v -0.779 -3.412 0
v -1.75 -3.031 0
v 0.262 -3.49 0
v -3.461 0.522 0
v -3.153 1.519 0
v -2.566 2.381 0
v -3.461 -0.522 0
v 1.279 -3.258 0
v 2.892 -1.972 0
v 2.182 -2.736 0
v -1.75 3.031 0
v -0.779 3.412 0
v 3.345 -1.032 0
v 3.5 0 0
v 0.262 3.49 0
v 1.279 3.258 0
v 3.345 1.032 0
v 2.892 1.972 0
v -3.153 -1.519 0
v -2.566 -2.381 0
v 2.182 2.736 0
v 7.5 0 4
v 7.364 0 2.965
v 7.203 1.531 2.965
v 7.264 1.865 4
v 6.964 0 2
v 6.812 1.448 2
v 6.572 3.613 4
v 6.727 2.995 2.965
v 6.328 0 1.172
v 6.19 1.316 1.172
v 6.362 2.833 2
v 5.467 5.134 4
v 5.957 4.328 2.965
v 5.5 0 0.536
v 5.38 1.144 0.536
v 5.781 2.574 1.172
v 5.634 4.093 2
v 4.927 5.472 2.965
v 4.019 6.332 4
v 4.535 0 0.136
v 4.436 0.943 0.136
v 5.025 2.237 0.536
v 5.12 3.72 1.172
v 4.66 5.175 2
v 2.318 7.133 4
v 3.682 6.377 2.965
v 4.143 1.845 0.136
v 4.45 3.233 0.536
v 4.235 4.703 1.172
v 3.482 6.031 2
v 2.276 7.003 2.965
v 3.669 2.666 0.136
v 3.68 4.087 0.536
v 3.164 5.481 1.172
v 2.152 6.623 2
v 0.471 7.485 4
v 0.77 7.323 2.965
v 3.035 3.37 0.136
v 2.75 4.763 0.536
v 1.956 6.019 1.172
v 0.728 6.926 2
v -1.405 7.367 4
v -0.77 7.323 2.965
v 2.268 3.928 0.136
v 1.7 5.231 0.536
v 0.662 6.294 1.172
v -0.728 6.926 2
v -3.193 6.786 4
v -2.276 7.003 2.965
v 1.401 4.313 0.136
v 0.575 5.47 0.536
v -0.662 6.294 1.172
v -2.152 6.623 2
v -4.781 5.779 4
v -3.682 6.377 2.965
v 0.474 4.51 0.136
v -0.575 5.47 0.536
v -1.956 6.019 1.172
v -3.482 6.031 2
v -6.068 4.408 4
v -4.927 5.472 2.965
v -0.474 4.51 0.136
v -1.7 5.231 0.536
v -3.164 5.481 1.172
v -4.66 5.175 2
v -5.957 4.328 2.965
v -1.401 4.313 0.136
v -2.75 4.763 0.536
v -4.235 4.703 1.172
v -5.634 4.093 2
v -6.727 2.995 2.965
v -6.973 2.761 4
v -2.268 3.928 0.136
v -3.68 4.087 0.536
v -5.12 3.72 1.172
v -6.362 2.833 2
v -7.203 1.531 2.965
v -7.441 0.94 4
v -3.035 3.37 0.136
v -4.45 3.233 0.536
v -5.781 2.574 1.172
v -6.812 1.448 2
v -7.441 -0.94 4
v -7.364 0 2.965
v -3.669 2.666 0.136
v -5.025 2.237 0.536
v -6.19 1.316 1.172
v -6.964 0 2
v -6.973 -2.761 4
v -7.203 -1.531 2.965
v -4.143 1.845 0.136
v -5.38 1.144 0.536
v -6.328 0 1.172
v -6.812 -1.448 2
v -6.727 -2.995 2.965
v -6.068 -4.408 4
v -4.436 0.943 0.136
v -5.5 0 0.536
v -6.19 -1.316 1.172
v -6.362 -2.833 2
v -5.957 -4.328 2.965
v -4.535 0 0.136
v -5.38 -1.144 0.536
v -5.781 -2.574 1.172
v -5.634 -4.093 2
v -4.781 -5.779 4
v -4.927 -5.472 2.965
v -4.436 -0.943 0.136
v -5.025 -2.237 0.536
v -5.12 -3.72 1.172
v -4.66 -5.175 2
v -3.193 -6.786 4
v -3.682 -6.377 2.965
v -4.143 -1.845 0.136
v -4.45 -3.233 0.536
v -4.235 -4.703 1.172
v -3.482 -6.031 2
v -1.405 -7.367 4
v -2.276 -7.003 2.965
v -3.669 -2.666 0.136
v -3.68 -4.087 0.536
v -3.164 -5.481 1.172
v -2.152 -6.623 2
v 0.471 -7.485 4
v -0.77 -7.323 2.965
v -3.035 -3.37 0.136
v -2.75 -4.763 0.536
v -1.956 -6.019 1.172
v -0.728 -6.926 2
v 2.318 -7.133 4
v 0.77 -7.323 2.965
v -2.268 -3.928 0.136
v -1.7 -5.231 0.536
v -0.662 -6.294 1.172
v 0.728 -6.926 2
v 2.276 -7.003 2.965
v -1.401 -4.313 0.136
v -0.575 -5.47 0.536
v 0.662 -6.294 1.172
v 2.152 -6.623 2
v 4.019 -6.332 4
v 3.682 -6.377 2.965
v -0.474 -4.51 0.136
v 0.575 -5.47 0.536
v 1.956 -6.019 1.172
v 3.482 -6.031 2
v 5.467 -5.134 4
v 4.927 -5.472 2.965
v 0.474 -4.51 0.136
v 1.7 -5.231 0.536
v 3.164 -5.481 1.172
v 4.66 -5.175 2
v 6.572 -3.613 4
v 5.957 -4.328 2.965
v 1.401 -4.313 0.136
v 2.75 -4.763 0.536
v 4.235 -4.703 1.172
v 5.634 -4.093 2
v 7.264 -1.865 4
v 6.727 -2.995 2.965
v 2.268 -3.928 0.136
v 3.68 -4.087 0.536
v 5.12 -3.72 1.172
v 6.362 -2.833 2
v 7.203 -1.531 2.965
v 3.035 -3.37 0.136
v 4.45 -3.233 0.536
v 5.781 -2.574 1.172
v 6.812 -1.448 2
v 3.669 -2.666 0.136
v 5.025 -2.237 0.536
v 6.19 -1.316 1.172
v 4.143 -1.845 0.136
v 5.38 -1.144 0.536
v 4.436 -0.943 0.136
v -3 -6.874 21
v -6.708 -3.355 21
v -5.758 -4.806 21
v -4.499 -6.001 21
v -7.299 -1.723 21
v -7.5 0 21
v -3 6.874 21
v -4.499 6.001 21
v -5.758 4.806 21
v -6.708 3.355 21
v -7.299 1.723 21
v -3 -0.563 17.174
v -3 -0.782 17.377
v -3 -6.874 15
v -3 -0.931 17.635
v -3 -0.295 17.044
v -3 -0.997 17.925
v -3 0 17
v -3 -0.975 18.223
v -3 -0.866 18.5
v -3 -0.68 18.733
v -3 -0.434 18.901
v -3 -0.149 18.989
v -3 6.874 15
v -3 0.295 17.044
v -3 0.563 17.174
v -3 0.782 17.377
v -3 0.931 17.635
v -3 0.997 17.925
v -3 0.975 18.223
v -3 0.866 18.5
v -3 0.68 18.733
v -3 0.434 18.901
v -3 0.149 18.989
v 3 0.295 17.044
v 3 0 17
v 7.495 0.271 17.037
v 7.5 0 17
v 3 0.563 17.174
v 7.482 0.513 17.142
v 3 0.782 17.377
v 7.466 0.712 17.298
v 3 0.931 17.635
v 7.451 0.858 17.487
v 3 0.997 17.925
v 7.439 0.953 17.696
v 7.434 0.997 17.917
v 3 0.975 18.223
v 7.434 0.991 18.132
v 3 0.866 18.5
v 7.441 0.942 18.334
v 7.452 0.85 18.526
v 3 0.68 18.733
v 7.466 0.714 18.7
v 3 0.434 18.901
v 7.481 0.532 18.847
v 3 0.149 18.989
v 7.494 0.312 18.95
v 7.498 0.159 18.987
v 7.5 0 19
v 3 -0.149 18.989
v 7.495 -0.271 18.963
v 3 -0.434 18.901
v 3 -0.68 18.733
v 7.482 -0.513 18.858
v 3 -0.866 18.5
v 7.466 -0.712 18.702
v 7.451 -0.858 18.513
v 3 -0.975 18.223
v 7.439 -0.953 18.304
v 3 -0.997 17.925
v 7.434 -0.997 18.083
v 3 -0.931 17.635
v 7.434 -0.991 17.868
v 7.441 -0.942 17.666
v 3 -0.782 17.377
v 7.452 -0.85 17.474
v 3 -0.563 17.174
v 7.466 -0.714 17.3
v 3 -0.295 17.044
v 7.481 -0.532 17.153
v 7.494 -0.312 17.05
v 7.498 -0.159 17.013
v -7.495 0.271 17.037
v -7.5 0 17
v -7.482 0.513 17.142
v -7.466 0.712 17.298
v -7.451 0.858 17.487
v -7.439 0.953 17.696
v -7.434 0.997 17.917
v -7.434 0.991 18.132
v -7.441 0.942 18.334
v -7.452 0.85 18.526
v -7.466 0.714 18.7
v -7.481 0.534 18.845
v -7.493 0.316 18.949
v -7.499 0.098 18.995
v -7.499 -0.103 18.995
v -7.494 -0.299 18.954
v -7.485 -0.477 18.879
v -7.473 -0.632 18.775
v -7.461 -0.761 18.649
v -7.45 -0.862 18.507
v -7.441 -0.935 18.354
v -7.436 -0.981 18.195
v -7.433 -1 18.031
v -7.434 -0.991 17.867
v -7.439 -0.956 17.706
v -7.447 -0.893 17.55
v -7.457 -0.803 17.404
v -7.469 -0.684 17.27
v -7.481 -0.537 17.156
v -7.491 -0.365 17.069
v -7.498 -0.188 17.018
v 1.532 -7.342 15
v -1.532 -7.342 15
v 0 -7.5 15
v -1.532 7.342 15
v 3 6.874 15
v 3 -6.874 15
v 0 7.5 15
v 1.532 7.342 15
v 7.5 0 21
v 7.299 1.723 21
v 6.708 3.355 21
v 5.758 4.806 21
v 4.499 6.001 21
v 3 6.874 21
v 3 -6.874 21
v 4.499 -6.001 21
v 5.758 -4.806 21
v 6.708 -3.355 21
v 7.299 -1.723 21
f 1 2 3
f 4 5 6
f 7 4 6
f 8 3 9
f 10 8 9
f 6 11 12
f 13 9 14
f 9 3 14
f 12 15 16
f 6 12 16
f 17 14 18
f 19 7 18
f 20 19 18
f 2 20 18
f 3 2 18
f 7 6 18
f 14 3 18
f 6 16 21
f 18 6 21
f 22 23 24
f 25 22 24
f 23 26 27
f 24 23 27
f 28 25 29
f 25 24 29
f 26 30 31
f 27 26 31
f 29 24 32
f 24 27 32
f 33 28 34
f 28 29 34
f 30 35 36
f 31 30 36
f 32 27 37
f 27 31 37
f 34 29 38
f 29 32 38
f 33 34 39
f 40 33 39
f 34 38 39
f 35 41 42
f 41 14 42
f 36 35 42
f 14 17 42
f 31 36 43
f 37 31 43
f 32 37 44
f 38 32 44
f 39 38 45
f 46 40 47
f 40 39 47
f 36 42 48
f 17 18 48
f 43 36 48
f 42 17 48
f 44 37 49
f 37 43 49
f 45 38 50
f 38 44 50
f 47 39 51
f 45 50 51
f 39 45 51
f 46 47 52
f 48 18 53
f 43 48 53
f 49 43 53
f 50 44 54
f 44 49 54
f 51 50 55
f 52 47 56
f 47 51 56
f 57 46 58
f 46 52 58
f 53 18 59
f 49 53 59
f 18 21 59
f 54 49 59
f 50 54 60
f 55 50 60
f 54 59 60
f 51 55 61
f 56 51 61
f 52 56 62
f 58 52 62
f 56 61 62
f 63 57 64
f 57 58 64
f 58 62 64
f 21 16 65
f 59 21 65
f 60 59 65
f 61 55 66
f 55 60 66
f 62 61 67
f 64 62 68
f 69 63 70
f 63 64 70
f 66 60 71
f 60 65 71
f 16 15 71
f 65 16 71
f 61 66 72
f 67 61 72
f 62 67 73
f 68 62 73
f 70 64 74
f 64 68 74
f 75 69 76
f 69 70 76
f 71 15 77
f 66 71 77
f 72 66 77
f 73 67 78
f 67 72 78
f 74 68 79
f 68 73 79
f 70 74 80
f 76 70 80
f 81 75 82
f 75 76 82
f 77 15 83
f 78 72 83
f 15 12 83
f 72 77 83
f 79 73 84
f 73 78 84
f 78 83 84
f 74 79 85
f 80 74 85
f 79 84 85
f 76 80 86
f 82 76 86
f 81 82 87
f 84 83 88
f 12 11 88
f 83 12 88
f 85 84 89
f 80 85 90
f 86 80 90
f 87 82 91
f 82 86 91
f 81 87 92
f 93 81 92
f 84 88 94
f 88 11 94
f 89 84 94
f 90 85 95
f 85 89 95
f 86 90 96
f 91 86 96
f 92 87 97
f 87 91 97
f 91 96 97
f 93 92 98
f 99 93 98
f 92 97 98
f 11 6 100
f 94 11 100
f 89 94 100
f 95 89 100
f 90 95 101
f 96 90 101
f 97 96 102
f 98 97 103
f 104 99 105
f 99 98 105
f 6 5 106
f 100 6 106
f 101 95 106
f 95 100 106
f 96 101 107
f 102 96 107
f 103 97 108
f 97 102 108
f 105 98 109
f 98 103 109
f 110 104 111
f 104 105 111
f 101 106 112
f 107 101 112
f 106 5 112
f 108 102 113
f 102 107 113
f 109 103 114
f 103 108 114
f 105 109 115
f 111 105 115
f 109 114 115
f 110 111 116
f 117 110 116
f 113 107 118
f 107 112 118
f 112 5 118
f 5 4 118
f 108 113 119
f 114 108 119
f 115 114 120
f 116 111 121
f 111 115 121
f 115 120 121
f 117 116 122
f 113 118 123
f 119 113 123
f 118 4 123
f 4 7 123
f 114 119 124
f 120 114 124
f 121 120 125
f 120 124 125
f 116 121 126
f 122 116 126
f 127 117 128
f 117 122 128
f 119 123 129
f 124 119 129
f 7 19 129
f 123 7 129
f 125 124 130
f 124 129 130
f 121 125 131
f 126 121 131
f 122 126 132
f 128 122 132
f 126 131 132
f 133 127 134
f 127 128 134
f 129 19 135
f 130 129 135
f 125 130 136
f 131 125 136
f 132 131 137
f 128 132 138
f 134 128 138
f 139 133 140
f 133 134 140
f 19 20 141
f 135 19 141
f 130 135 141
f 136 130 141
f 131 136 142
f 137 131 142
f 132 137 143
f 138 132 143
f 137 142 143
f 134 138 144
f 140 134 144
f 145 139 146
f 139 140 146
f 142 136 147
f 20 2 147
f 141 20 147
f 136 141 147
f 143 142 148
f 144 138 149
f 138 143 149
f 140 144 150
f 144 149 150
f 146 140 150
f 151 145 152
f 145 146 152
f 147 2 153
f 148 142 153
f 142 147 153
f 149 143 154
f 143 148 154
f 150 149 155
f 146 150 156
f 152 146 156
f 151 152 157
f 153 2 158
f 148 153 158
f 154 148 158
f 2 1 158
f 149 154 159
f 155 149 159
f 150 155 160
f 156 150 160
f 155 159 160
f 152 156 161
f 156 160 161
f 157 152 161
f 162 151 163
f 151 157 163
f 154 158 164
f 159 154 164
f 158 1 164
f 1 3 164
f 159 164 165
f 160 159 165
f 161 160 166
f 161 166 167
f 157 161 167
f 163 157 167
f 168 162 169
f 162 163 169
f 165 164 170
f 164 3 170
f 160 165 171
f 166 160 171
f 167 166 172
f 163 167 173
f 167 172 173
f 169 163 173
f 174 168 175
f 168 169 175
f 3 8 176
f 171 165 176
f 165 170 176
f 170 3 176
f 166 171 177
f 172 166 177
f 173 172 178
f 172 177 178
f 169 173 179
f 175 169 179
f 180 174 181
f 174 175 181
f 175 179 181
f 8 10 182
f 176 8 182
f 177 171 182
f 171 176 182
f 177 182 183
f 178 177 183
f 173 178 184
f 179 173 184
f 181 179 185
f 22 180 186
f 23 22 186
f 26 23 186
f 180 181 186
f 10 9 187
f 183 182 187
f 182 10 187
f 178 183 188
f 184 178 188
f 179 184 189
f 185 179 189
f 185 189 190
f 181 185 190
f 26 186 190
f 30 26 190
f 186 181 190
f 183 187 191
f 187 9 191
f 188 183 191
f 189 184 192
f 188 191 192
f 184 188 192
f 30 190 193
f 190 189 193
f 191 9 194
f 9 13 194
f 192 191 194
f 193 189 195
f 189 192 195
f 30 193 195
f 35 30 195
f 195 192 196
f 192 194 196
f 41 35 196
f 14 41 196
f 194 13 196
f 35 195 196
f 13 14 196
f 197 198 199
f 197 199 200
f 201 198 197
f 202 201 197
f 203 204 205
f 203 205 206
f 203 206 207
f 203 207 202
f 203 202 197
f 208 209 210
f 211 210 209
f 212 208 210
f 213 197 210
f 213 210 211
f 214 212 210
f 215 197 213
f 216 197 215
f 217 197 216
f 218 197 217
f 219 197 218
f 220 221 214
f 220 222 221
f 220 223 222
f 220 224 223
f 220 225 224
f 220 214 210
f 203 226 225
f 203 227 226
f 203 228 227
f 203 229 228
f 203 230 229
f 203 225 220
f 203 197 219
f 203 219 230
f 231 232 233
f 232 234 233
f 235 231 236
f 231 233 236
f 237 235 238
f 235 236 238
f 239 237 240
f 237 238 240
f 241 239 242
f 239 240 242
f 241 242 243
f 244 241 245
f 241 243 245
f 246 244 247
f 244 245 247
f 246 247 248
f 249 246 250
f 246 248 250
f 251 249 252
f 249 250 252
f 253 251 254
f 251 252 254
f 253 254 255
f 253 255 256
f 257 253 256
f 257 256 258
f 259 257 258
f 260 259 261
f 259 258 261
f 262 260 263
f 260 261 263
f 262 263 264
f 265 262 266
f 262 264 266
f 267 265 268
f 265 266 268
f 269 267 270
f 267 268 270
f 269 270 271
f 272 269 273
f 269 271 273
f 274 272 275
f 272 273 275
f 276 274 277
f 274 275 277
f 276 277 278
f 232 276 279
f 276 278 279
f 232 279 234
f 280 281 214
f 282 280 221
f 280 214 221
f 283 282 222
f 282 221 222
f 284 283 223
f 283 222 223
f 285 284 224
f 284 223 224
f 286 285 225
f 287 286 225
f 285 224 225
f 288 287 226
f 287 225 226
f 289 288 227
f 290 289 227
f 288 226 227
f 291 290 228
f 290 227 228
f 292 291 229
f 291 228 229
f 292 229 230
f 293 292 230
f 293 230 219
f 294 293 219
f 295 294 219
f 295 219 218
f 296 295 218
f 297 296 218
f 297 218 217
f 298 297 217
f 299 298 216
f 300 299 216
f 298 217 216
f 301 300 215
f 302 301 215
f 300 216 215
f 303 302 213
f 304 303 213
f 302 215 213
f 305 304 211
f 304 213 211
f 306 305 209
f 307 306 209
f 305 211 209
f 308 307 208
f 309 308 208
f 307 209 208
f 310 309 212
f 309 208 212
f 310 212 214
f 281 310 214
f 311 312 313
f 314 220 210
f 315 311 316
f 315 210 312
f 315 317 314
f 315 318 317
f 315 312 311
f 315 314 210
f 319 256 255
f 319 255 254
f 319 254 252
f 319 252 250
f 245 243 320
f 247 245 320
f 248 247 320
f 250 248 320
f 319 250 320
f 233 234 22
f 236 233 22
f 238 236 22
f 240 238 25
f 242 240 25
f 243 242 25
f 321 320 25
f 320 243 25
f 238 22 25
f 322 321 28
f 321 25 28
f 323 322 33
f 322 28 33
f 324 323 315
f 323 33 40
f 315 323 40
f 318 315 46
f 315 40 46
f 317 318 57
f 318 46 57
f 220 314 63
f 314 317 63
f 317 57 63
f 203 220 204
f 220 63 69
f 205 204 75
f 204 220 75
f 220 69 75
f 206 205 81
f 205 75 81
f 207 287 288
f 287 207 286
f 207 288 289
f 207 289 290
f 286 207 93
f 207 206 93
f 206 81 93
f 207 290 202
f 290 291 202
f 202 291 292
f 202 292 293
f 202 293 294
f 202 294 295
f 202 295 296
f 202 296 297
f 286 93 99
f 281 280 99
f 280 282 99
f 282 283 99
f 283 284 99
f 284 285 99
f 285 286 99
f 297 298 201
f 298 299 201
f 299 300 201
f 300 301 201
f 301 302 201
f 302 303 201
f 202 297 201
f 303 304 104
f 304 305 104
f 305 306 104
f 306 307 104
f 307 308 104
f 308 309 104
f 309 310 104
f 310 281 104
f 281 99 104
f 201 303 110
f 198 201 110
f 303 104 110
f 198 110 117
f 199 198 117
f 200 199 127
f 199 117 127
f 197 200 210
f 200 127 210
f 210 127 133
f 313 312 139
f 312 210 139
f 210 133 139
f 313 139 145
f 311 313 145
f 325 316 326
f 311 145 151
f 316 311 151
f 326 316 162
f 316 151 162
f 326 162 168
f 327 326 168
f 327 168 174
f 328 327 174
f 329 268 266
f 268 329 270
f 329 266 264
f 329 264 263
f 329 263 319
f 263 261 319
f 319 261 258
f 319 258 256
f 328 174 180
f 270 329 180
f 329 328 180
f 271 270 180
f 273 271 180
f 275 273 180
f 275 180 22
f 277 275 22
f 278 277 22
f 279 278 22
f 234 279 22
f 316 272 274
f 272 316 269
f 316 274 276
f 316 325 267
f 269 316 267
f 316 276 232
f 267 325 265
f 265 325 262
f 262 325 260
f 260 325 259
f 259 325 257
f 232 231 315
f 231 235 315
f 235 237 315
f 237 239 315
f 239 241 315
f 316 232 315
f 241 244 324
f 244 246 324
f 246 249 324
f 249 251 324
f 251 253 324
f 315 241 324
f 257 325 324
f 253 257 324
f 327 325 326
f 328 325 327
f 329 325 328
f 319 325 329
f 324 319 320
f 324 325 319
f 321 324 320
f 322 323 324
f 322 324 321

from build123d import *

# Parameters (mm, degrees)
CROQUIS1_R              = 7.5
SALIENTE_EXTRUIR1_DEPTH = 21
CROQUIS2_R              = 1
CORTAR_EXTRUIR1_DEPTH   = 10.5
CROQUIS3_W              = 6
CROQUIS3_H              = 18
CORTAR_EXTRUIR2_DEPTH   = 6
REDONDEO1_R             = 4


with BuildPart() as part:
    # Croquis1 → Saliente-Extruir1 (new body)
    with BuildSketch(Plane.XY):
        Circle(CROQUIS1_R)
    extrude(amount=SALIENTE_EXTRUIR1_DEPTH)

    # Croquis2 → Cortar-Extruir1 (cut, symmetric)
    with BuildSketch(Plane(origin=(0, 0, 0), x_dir=(0, 0, -1), z_dir=(1, 0, 0))):
        with Locations((-18, 0)):
            Circle(CROQUIS2_R)
    extrude(amount=CORTAR_EXTRUIR1_DEPTH, both=True, mode=Mode.SUBTRACT)

    # Croquis3 → Cortar-Extruir2 (cut)
    with BuildSketch(Plane.XY.offset(21)):
        Rectangle(CROQUIS3_W, CROQUIS3_H)
    extrude(amount=-CORTAR_EXTRUIR2_DEPTH, mode=Mode.SUBTRACT)

    # Redondeo1
    redondeo1_edges = [part.edges().sort_by_distance(p)[0] for p in [
        (-7.5, 0, 0),
    ]]
    fillet(redondeo1_edges, radius=REDONDEO1_R)


solid = part.part
